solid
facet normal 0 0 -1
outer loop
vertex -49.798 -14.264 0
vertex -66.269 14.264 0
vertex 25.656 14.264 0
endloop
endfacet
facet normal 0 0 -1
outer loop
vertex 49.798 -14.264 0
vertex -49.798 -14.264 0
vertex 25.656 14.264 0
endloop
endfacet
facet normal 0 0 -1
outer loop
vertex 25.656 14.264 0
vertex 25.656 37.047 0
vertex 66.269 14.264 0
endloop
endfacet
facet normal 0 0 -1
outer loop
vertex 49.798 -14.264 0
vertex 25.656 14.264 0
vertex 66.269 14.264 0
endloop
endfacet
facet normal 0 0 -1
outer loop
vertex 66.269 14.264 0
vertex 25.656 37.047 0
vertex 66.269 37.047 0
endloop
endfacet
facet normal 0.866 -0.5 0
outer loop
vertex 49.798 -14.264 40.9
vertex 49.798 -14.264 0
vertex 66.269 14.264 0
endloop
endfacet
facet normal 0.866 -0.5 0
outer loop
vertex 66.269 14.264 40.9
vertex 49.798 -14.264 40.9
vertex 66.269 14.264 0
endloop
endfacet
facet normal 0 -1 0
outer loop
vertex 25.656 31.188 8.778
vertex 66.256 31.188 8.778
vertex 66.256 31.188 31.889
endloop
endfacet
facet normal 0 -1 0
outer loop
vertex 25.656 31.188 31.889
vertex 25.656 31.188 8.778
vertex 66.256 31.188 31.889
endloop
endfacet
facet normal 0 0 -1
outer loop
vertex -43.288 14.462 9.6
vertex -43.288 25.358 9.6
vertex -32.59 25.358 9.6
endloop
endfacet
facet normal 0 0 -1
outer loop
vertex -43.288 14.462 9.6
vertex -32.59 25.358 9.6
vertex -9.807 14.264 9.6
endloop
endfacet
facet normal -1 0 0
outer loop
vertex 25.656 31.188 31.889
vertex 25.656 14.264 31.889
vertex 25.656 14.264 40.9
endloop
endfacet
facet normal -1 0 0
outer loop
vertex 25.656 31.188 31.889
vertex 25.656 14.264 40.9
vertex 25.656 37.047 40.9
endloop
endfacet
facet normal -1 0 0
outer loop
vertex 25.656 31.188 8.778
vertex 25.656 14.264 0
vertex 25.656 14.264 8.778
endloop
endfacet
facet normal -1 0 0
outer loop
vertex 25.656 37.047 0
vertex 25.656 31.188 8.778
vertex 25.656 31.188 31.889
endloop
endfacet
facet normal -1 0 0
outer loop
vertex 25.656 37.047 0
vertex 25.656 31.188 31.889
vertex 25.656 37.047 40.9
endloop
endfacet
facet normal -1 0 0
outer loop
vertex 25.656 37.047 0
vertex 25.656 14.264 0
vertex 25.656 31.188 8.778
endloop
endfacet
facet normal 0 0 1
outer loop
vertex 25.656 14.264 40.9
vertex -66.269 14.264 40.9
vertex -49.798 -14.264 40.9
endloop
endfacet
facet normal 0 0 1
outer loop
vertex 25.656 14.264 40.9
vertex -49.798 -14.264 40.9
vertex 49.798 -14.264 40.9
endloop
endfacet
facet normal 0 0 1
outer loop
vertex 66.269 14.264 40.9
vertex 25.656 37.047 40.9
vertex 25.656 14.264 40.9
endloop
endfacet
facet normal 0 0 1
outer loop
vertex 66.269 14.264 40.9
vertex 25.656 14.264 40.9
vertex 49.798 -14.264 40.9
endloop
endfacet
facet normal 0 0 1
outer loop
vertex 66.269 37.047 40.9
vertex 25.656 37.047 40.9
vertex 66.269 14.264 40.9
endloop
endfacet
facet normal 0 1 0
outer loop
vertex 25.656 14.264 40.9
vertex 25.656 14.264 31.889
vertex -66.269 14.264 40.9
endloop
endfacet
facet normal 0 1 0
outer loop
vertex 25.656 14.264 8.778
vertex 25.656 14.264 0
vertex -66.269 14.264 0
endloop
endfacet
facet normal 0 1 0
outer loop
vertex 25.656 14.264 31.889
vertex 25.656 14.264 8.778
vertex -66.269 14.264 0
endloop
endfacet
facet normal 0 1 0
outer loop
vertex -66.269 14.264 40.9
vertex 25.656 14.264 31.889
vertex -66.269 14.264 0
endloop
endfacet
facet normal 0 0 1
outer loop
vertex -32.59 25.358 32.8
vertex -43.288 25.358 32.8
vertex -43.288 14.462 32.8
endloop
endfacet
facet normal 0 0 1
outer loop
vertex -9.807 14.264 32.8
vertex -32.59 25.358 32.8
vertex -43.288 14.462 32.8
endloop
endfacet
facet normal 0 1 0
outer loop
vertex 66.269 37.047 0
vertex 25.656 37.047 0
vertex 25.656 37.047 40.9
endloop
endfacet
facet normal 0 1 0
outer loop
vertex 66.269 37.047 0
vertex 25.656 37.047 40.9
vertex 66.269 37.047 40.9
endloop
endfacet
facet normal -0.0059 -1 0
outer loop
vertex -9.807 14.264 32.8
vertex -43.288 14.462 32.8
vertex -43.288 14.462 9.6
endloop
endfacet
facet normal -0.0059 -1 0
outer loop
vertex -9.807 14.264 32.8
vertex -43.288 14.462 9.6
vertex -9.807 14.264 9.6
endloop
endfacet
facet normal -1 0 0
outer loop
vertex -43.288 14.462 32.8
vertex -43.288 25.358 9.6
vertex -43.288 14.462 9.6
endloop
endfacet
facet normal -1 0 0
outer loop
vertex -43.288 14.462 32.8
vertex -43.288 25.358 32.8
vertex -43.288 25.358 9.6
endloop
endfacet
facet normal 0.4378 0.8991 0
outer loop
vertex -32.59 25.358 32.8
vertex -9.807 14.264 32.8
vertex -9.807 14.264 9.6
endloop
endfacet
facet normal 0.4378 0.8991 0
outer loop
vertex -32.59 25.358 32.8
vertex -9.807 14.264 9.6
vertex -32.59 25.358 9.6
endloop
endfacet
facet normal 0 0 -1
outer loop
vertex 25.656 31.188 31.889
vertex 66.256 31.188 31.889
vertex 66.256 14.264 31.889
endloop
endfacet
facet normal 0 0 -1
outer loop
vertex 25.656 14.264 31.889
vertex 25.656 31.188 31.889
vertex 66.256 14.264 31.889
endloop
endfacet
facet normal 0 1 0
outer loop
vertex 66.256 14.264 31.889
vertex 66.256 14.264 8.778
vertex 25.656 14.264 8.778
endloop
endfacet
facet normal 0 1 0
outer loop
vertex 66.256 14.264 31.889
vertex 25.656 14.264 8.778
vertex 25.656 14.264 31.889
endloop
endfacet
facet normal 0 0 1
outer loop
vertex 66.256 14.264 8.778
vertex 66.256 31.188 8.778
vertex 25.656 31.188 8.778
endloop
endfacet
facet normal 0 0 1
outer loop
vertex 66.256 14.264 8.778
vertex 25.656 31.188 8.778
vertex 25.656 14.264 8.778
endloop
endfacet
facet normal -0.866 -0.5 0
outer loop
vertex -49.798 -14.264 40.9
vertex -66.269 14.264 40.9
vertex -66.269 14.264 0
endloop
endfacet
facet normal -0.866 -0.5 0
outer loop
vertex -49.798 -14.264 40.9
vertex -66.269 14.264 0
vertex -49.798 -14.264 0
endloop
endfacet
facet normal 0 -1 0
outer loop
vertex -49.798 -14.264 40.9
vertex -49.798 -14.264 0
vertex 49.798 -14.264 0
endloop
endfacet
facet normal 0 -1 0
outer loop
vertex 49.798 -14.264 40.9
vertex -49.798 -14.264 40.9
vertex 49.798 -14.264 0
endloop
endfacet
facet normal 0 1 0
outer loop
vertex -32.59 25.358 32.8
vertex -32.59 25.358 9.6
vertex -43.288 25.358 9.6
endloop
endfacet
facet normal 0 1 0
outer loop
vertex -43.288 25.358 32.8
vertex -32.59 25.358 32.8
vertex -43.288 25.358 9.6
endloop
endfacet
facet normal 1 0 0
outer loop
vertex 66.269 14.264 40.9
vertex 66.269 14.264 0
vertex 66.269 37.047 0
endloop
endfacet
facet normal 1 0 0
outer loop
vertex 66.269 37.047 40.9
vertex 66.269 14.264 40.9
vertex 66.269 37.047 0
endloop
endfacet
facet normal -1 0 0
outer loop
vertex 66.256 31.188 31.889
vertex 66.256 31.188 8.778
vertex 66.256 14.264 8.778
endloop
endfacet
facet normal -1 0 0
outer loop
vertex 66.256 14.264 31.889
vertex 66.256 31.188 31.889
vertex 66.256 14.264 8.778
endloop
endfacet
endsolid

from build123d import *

# Parameters (mm, degrees)
F0_W     = 40.613208
F0_H     = 22.783019
F1_DEPTH = 40.9
F4_DEPTH = 11.6
F5_W     = 16.923557
F5_H     = 23.111026
F6_DEPTH = 40.6


with BuildPart() as f1:
    # F0 (on Top) → F1 (new body)
    with BuildSketch(Plane.XY):
        Polygon((25.655661, 14.264151), (-66.268869, 14.264151), (-49.798045, -14.264151), (49.798045, -14.264151), (66.268869, 14.264151), align=None)
        with Locations((45.962265, 25.65566)):
            Rectangle(F0_W, F0_H)
    extrude(amount=F1_DEPTH)

    # F5 (on face) → F6 (cut)
    with BuildSketch(Plane(origin=(25.655661, 0, 0), x_dir=(0, -1, 0), z_dir=(-1, 0, 0))):
        with Locations((-22.725929, 20.333911)):
            Rectangle(F5_W, F5_H)
    extrude(amount=-F6_DEPTH, mode=Mode.SUBTRACT)


with BuildPart() as f4:
    # F3 (on offset) → F4 (new body, symmetric)
    with BuildSketch(Plane.XY.offset(21.2)):
        Polygon((-43.287739, 25.358491), (-43.287739, 14.462264), (-9.806605, 14.264151), (-32.589626, 25.358491), align=None)
    extrude(amount=F4_DEPTH, both=True)


solid = Compound([f1.part, f4.part])
